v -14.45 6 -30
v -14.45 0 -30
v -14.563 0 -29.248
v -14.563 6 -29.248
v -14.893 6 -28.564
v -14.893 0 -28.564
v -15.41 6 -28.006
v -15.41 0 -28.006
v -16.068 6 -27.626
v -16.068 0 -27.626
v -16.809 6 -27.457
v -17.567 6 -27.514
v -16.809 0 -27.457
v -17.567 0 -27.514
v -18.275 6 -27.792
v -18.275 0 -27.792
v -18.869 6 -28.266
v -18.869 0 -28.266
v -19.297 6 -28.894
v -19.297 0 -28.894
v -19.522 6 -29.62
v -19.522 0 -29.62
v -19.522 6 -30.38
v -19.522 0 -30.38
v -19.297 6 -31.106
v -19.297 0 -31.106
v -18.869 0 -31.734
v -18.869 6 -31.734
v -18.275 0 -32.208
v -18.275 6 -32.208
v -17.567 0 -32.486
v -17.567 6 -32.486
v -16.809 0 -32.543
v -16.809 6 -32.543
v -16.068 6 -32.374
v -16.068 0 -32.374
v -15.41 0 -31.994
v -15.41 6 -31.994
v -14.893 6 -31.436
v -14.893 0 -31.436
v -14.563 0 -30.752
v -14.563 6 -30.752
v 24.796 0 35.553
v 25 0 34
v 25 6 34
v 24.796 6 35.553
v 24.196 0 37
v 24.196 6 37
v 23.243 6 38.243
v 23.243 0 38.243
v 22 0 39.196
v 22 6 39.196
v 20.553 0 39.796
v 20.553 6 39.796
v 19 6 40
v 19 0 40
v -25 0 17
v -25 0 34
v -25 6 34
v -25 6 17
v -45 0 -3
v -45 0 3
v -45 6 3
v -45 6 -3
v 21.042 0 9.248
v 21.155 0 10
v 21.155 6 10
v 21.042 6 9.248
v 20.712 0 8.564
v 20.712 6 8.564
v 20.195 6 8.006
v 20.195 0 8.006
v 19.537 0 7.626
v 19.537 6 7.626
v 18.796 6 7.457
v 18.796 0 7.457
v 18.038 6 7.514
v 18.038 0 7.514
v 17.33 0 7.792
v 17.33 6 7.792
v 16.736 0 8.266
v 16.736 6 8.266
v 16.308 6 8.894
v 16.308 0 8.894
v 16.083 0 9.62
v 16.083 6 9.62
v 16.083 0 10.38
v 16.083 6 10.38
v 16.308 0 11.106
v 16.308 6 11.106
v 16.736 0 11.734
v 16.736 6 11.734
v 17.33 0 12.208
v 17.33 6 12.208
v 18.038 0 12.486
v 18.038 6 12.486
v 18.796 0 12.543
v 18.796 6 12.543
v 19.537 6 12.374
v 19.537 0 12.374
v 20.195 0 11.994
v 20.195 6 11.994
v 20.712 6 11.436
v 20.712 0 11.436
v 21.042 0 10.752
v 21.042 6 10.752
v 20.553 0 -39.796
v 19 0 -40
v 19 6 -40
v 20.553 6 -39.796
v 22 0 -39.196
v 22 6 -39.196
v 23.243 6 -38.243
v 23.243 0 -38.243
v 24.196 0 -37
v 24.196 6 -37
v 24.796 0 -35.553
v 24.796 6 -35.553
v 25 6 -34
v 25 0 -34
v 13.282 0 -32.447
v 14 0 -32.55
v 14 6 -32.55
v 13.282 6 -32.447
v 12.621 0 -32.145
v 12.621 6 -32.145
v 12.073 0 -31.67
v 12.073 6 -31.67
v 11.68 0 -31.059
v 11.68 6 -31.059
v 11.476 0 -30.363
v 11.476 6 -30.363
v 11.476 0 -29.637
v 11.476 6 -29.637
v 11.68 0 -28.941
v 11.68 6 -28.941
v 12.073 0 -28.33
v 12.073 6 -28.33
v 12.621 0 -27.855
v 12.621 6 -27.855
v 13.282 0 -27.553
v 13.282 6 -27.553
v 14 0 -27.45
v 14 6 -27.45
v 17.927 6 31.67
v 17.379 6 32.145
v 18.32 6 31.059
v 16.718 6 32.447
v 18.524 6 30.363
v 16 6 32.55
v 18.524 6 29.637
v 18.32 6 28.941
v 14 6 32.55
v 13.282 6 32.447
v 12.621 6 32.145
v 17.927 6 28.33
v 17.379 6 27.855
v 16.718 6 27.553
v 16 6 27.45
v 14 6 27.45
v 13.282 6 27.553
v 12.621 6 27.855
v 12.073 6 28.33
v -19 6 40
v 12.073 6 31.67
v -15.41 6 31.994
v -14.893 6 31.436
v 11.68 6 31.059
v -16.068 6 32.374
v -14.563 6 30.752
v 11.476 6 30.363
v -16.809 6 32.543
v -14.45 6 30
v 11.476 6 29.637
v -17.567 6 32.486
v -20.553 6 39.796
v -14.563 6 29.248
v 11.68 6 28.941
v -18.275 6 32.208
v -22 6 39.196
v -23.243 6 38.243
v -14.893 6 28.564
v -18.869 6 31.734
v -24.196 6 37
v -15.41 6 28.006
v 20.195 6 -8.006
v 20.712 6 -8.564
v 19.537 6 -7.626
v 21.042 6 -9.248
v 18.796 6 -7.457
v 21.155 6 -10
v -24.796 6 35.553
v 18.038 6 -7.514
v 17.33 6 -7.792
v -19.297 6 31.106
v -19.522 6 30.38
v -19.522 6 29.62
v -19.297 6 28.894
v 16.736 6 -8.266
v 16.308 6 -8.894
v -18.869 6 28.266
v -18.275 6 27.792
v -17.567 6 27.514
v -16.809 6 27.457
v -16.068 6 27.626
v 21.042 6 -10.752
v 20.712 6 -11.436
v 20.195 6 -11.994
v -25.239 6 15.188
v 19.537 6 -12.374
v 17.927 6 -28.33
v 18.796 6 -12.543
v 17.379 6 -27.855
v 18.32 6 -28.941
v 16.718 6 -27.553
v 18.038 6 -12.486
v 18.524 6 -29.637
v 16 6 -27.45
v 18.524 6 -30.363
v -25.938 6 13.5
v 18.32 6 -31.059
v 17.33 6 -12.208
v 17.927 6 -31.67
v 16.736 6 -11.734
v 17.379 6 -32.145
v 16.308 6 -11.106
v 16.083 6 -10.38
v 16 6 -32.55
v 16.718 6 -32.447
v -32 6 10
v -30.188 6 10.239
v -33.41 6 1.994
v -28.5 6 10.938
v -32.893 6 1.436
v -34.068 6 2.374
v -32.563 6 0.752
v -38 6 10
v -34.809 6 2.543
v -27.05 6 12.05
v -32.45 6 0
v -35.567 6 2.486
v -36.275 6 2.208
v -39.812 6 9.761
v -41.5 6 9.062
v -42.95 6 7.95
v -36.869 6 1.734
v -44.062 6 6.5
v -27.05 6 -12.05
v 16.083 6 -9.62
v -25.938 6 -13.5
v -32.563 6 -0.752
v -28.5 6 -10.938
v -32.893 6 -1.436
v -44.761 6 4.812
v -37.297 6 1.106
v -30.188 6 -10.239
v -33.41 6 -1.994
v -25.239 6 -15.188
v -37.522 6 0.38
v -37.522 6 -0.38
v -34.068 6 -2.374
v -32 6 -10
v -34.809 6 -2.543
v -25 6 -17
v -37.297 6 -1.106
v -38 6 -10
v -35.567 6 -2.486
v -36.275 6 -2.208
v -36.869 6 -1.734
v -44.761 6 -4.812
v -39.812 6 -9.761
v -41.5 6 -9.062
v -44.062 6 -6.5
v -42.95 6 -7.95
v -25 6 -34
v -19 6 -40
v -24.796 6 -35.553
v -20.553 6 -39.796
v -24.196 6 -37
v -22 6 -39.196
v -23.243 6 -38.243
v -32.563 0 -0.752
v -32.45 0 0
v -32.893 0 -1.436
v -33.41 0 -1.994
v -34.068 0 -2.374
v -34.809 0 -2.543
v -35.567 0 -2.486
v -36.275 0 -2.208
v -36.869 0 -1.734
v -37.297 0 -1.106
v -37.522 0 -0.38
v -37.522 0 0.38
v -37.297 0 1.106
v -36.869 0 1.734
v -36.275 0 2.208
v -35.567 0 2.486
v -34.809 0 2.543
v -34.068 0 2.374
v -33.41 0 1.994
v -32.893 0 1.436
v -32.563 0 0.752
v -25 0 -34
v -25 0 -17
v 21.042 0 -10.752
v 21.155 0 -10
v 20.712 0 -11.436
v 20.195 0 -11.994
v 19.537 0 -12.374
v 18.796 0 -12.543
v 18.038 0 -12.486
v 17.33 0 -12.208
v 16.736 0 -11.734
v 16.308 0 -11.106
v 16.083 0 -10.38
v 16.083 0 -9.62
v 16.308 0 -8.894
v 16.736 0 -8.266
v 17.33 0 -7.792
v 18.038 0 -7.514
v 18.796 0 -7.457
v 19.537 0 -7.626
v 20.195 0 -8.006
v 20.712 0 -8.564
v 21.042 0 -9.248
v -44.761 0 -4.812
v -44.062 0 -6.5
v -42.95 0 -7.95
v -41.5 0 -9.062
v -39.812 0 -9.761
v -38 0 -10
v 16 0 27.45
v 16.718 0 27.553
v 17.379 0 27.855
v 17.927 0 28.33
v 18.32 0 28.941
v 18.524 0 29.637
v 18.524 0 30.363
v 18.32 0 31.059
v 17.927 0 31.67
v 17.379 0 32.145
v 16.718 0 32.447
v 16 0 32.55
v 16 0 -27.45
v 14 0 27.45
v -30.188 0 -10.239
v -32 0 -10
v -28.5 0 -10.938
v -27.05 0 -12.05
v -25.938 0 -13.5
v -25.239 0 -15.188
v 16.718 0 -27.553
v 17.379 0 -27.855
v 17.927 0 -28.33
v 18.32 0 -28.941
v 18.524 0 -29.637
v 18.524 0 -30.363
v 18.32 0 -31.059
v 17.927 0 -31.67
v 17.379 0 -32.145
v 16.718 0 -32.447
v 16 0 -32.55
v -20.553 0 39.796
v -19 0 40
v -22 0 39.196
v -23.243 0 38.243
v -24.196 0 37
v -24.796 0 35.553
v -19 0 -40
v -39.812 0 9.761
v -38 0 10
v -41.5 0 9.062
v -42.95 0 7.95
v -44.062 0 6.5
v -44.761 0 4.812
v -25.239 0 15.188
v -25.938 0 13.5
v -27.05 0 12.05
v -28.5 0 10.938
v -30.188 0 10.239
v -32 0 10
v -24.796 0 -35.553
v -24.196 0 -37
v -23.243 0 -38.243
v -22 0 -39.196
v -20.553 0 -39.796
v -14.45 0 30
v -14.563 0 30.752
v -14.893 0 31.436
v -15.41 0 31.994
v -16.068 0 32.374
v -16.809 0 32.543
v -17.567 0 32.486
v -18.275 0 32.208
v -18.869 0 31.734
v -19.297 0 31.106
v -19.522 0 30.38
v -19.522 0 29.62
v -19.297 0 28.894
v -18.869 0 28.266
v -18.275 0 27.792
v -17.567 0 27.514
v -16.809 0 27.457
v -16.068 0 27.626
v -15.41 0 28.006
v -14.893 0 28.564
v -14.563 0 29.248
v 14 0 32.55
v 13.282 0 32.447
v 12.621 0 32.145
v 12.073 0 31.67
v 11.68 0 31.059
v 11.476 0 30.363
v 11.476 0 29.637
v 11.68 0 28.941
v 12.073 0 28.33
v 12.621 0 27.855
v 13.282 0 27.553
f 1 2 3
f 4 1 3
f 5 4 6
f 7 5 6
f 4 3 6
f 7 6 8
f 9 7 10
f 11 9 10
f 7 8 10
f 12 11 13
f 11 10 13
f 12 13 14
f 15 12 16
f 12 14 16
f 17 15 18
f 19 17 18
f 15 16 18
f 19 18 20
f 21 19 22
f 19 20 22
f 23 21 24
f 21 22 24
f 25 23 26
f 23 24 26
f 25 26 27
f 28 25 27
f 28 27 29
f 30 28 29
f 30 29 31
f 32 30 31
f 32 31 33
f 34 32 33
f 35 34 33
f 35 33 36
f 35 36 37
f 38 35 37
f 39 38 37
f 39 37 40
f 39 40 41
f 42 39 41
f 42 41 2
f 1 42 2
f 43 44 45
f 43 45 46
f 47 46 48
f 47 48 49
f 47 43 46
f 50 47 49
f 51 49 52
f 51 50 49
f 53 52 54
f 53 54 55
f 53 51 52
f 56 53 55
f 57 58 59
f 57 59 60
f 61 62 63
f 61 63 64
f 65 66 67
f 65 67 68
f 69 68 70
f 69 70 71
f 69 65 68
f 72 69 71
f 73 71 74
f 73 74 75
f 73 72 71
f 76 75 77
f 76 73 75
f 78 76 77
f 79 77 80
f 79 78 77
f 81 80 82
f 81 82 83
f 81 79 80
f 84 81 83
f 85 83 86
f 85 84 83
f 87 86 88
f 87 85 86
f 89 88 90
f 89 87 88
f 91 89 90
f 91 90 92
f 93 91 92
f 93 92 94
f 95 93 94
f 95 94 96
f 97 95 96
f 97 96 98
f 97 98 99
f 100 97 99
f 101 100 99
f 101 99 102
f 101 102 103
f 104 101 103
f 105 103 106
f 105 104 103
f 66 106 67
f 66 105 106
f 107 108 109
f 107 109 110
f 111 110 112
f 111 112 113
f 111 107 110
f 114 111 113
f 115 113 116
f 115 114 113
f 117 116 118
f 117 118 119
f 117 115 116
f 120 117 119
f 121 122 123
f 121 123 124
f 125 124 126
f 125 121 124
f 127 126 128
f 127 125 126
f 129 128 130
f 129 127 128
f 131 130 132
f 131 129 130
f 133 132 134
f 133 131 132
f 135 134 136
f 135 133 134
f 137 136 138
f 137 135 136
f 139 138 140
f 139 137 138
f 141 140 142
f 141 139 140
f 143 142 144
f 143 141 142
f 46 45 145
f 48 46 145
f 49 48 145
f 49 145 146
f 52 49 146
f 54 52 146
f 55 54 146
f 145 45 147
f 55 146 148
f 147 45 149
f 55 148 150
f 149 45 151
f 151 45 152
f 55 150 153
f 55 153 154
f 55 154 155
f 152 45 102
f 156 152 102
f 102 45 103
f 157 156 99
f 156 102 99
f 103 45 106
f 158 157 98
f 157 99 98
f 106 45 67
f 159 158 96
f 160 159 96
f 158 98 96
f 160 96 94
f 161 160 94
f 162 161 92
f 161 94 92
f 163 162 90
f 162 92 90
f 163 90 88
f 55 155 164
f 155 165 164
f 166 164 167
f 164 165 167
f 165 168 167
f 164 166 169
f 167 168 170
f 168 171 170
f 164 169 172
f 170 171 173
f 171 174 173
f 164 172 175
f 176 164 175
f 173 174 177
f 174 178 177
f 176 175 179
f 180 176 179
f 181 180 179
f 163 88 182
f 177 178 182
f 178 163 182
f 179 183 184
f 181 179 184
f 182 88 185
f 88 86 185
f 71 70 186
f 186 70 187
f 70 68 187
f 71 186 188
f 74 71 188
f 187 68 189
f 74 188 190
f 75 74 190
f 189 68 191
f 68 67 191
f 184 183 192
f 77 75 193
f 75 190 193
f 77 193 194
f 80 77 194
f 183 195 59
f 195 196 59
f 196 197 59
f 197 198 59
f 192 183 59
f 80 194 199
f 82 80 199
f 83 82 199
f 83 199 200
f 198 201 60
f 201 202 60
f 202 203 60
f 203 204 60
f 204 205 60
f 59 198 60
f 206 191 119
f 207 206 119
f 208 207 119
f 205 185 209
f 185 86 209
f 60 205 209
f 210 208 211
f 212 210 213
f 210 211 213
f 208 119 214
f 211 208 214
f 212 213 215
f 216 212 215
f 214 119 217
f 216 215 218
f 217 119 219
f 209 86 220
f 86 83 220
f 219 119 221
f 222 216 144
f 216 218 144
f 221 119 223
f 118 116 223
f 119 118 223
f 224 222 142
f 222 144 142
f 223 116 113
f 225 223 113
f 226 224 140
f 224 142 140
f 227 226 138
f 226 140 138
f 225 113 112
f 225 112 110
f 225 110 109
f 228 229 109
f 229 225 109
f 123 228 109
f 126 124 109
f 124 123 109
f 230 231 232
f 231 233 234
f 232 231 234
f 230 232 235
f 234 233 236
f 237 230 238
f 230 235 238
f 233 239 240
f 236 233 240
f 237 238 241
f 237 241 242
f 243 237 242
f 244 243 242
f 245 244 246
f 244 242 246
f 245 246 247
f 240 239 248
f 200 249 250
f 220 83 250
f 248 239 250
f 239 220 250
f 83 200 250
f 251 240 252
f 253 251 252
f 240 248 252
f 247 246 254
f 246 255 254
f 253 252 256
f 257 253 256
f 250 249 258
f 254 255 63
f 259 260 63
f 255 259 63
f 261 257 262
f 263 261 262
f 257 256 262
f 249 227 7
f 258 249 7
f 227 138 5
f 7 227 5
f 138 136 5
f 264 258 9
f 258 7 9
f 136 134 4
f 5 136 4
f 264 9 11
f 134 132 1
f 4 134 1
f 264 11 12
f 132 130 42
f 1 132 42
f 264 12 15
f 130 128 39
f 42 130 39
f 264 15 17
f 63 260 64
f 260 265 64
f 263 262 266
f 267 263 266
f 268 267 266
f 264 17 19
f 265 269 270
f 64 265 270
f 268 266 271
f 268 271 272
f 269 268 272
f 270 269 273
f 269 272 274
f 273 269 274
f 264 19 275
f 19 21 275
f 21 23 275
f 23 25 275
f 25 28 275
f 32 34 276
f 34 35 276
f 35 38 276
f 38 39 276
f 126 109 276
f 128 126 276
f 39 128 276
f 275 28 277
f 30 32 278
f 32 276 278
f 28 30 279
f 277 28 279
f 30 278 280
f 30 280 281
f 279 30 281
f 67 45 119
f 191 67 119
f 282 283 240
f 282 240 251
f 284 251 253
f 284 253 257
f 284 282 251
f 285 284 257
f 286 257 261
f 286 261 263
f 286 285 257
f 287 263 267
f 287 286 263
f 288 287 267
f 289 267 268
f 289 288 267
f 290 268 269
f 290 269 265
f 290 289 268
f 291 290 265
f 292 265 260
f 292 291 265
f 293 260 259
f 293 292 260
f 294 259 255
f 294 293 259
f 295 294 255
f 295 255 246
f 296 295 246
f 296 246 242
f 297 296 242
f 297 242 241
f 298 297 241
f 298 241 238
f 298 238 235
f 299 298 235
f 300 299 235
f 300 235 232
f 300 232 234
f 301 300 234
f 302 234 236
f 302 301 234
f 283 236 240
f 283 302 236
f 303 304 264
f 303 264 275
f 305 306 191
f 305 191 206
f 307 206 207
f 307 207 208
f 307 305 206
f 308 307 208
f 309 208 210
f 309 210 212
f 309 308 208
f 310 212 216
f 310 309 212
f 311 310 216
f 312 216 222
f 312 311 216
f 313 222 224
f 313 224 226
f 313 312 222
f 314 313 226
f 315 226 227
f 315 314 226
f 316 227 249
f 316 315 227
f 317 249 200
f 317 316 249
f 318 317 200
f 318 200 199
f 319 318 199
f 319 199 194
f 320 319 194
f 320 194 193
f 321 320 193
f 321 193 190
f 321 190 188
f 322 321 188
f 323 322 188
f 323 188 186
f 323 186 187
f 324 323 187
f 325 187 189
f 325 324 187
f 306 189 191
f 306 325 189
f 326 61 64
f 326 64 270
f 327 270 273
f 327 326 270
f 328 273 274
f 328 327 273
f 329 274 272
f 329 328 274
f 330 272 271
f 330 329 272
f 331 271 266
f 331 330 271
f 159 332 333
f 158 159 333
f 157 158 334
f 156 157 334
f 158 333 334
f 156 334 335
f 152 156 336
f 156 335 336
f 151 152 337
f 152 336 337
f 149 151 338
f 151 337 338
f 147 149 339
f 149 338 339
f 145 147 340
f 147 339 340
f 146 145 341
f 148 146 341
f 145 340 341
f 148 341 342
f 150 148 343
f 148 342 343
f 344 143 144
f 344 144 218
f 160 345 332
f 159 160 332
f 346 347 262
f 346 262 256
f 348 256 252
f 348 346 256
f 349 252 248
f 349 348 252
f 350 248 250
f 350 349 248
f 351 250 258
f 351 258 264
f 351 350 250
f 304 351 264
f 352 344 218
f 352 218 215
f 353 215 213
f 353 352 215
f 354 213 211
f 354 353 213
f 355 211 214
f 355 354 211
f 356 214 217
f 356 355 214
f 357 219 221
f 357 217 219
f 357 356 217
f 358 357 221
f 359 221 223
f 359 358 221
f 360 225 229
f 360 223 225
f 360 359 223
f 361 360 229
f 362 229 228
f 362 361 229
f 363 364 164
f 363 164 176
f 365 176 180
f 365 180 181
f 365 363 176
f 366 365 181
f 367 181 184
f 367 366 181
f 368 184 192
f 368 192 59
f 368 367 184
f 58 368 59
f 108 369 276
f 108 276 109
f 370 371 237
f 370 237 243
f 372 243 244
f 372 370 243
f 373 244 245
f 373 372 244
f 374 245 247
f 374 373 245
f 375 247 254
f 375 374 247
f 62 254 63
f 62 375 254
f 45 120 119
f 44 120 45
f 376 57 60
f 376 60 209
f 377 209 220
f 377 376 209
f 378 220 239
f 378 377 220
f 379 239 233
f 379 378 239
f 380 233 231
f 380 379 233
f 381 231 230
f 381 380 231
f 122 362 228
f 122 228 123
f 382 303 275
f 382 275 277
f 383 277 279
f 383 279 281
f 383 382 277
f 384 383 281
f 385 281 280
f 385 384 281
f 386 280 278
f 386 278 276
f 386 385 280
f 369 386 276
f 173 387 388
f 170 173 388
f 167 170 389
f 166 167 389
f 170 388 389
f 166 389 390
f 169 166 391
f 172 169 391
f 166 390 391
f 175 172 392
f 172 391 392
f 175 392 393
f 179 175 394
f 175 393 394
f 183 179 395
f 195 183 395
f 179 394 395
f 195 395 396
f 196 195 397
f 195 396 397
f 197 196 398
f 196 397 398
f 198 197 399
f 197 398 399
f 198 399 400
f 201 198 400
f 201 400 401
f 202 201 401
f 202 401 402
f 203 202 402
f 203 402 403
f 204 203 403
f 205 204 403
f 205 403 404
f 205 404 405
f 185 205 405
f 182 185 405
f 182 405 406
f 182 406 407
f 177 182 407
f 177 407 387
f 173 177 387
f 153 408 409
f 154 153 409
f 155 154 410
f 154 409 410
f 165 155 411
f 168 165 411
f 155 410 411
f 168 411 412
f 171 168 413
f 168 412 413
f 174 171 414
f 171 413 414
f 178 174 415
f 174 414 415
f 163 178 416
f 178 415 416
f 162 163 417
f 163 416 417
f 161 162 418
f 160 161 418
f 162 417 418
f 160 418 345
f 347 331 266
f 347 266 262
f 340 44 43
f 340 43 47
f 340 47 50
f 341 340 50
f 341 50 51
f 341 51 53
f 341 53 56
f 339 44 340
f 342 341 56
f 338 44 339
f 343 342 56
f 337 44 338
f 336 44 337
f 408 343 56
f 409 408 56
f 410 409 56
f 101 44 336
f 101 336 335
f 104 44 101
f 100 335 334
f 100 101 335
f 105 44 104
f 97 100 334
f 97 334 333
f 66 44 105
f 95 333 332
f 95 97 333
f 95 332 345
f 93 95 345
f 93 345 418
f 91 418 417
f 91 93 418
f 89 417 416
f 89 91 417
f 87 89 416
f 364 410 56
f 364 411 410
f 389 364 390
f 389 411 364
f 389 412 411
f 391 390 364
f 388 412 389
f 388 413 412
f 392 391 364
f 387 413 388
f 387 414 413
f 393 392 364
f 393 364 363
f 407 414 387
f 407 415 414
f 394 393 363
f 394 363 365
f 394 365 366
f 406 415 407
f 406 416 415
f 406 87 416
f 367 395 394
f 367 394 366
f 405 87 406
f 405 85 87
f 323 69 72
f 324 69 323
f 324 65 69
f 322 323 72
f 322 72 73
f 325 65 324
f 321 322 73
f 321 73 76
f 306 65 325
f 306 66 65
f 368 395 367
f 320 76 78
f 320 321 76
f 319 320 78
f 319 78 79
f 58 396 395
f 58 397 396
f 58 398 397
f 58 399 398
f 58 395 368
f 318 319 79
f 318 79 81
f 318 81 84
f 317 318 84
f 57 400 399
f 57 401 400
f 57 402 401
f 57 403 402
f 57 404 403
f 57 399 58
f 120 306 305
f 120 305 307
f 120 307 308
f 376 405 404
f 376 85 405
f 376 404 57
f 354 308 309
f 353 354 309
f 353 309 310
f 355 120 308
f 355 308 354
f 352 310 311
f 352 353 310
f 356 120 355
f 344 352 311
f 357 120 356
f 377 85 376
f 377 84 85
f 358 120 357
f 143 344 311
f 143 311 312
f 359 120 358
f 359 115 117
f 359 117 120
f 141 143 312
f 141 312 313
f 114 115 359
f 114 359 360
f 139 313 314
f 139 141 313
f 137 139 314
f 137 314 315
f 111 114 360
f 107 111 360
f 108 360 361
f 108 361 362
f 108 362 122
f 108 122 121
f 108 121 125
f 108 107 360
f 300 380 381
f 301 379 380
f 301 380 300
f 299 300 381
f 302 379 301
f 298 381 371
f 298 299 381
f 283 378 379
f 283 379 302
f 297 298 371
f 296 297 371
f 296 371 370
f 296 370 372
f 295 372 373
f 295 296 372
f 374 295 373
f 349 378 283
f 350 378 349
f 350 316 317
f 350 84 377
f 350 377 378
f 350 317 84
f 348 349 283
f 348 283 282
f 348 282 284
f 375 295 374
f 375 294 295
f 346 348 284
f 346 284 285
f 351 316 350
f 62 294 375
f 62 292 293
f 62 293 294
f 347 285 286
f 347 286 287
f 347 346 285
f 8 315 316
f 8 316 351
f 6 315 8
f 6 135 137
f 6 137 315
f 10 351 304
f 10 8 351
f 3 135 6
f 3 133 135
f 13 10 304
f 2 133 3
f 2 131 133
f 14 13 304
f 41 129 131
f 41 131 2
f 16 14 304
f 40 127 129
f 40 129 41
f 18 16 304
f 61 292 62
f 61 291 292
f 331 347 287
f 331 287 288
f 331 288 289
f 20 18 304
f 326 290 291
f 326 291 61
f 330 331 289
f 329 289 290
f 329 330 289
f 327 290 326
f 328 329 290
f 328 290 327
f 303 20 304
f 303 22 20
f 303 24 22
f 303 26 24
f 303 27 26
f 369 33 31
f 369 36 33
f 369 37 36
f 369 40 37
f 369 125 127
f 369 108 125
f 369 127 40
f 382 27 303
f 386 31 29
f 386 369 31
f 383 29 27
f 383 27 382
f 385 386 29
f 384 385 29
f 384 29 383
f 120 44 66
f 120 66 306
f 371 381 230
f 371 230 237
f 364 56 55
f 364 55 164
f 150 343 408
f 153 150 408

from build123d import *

# Parameters (mm, degrees)
SKETCH_1_R          = 2.55
EXTRUDE_1_DEPTH     = 6
SKETCH_2_R          = 2.55
CUT_EXTRUDE_1_DEPTH = 7


with BuildPart() as part:
    # Эскиз1 → Бобышка-Вытянуть1 (new body)
    with BuildSketch(Plane(origin=(0, 0, 0), x_dir=(1, 0, 0), z_dir=(0, 1, 0))):
        with BuildLine():
            Line((-32, -10), (-38, -10))
            ThreePointArc((-38, -10), (-42.949747468, -7.949747468), (-45, -3))
            Line((-45, -3), (-45, 3))
            ThreePointArc((-45, 3), (-42.949747468, 7.949747468), (-38, 10))
            Line((-38, 10), (-32, 10))
            ThreePointArc((-32, 10), (-27.050252532, 12.050252532), (-25, 17))
            Line((-25, 17), (-25, 34))
            ThreePointArc((-25, 34), (-23.242640687, 38.242640687), (-19, 40))
            Line((-19, 40), (19, 40))
            ThreePointArc((19, 40), (23.242640687, 38.242640687), (25, 34))
            Line((25, 34), (25, -34))
            ThreePointArc((25, -34), (23.242640687, -38.242640687), (19, -40))
            Line((19, -40), (-19, -40))
            ThreePointArc((-19, -40), (-23.242640687, -38.242640687), (-25, -34))
            Line((-25, -34), (-25, -17))
            ThreePointArc((-25, -17), (-27.050252532, -12.050252532), (-32, -10))
        make_face()
        with Locations((-35, 0)):
            Circle(SKETCH_1_R, mode=Mode.SUBTRACT)
        with Locations((18.605, 10)):
            Circle(SKETCH_1_R, mode=Mode.SUBTRACT)
        with Locations((18.605, -10)):
            Circle(SKETCH_1_R, mode=Mode.SUBTRACT)
    extrude(amount=EXTRUDE_1_DEPTH)

    # Эскиз2 → Вырез-Вытянуть1 (cut, through all)
    with BuildSketch(Plane.XZ):
        with Locations((-17, -30)):
            Circle(SKETCH_2_R)
        with Locations((-17, 30)):
            Circle(SKETCH_2_R)
        with BuildLine():
            Line((16, -32.55), (14, -32.55))
            ThreePointArc((14, -32.55), (11.45, -30), (14, -27.45))
            Line((14, -27.45), (16, -27.45))
            ThreePointArc((16, -27.45), (18.55, -30), (16, -32.55))
        make_face()
        with BuildLine():
            Line((16, 32.55), (14, 32.55))
            ThreePointArc((14, 32.55), (11.45, 30), (14, 27.45))
            Line((14, 27.45), (16, 27.45))
            ThreePointArc((16, 27.45), (18.55, 30), (16, 32.55))
        make_face()
    extrude(amount=-CUT_EXTRUDE_1_DEPTH, mode=Mode.SUBTRACT)


solid = part.part
